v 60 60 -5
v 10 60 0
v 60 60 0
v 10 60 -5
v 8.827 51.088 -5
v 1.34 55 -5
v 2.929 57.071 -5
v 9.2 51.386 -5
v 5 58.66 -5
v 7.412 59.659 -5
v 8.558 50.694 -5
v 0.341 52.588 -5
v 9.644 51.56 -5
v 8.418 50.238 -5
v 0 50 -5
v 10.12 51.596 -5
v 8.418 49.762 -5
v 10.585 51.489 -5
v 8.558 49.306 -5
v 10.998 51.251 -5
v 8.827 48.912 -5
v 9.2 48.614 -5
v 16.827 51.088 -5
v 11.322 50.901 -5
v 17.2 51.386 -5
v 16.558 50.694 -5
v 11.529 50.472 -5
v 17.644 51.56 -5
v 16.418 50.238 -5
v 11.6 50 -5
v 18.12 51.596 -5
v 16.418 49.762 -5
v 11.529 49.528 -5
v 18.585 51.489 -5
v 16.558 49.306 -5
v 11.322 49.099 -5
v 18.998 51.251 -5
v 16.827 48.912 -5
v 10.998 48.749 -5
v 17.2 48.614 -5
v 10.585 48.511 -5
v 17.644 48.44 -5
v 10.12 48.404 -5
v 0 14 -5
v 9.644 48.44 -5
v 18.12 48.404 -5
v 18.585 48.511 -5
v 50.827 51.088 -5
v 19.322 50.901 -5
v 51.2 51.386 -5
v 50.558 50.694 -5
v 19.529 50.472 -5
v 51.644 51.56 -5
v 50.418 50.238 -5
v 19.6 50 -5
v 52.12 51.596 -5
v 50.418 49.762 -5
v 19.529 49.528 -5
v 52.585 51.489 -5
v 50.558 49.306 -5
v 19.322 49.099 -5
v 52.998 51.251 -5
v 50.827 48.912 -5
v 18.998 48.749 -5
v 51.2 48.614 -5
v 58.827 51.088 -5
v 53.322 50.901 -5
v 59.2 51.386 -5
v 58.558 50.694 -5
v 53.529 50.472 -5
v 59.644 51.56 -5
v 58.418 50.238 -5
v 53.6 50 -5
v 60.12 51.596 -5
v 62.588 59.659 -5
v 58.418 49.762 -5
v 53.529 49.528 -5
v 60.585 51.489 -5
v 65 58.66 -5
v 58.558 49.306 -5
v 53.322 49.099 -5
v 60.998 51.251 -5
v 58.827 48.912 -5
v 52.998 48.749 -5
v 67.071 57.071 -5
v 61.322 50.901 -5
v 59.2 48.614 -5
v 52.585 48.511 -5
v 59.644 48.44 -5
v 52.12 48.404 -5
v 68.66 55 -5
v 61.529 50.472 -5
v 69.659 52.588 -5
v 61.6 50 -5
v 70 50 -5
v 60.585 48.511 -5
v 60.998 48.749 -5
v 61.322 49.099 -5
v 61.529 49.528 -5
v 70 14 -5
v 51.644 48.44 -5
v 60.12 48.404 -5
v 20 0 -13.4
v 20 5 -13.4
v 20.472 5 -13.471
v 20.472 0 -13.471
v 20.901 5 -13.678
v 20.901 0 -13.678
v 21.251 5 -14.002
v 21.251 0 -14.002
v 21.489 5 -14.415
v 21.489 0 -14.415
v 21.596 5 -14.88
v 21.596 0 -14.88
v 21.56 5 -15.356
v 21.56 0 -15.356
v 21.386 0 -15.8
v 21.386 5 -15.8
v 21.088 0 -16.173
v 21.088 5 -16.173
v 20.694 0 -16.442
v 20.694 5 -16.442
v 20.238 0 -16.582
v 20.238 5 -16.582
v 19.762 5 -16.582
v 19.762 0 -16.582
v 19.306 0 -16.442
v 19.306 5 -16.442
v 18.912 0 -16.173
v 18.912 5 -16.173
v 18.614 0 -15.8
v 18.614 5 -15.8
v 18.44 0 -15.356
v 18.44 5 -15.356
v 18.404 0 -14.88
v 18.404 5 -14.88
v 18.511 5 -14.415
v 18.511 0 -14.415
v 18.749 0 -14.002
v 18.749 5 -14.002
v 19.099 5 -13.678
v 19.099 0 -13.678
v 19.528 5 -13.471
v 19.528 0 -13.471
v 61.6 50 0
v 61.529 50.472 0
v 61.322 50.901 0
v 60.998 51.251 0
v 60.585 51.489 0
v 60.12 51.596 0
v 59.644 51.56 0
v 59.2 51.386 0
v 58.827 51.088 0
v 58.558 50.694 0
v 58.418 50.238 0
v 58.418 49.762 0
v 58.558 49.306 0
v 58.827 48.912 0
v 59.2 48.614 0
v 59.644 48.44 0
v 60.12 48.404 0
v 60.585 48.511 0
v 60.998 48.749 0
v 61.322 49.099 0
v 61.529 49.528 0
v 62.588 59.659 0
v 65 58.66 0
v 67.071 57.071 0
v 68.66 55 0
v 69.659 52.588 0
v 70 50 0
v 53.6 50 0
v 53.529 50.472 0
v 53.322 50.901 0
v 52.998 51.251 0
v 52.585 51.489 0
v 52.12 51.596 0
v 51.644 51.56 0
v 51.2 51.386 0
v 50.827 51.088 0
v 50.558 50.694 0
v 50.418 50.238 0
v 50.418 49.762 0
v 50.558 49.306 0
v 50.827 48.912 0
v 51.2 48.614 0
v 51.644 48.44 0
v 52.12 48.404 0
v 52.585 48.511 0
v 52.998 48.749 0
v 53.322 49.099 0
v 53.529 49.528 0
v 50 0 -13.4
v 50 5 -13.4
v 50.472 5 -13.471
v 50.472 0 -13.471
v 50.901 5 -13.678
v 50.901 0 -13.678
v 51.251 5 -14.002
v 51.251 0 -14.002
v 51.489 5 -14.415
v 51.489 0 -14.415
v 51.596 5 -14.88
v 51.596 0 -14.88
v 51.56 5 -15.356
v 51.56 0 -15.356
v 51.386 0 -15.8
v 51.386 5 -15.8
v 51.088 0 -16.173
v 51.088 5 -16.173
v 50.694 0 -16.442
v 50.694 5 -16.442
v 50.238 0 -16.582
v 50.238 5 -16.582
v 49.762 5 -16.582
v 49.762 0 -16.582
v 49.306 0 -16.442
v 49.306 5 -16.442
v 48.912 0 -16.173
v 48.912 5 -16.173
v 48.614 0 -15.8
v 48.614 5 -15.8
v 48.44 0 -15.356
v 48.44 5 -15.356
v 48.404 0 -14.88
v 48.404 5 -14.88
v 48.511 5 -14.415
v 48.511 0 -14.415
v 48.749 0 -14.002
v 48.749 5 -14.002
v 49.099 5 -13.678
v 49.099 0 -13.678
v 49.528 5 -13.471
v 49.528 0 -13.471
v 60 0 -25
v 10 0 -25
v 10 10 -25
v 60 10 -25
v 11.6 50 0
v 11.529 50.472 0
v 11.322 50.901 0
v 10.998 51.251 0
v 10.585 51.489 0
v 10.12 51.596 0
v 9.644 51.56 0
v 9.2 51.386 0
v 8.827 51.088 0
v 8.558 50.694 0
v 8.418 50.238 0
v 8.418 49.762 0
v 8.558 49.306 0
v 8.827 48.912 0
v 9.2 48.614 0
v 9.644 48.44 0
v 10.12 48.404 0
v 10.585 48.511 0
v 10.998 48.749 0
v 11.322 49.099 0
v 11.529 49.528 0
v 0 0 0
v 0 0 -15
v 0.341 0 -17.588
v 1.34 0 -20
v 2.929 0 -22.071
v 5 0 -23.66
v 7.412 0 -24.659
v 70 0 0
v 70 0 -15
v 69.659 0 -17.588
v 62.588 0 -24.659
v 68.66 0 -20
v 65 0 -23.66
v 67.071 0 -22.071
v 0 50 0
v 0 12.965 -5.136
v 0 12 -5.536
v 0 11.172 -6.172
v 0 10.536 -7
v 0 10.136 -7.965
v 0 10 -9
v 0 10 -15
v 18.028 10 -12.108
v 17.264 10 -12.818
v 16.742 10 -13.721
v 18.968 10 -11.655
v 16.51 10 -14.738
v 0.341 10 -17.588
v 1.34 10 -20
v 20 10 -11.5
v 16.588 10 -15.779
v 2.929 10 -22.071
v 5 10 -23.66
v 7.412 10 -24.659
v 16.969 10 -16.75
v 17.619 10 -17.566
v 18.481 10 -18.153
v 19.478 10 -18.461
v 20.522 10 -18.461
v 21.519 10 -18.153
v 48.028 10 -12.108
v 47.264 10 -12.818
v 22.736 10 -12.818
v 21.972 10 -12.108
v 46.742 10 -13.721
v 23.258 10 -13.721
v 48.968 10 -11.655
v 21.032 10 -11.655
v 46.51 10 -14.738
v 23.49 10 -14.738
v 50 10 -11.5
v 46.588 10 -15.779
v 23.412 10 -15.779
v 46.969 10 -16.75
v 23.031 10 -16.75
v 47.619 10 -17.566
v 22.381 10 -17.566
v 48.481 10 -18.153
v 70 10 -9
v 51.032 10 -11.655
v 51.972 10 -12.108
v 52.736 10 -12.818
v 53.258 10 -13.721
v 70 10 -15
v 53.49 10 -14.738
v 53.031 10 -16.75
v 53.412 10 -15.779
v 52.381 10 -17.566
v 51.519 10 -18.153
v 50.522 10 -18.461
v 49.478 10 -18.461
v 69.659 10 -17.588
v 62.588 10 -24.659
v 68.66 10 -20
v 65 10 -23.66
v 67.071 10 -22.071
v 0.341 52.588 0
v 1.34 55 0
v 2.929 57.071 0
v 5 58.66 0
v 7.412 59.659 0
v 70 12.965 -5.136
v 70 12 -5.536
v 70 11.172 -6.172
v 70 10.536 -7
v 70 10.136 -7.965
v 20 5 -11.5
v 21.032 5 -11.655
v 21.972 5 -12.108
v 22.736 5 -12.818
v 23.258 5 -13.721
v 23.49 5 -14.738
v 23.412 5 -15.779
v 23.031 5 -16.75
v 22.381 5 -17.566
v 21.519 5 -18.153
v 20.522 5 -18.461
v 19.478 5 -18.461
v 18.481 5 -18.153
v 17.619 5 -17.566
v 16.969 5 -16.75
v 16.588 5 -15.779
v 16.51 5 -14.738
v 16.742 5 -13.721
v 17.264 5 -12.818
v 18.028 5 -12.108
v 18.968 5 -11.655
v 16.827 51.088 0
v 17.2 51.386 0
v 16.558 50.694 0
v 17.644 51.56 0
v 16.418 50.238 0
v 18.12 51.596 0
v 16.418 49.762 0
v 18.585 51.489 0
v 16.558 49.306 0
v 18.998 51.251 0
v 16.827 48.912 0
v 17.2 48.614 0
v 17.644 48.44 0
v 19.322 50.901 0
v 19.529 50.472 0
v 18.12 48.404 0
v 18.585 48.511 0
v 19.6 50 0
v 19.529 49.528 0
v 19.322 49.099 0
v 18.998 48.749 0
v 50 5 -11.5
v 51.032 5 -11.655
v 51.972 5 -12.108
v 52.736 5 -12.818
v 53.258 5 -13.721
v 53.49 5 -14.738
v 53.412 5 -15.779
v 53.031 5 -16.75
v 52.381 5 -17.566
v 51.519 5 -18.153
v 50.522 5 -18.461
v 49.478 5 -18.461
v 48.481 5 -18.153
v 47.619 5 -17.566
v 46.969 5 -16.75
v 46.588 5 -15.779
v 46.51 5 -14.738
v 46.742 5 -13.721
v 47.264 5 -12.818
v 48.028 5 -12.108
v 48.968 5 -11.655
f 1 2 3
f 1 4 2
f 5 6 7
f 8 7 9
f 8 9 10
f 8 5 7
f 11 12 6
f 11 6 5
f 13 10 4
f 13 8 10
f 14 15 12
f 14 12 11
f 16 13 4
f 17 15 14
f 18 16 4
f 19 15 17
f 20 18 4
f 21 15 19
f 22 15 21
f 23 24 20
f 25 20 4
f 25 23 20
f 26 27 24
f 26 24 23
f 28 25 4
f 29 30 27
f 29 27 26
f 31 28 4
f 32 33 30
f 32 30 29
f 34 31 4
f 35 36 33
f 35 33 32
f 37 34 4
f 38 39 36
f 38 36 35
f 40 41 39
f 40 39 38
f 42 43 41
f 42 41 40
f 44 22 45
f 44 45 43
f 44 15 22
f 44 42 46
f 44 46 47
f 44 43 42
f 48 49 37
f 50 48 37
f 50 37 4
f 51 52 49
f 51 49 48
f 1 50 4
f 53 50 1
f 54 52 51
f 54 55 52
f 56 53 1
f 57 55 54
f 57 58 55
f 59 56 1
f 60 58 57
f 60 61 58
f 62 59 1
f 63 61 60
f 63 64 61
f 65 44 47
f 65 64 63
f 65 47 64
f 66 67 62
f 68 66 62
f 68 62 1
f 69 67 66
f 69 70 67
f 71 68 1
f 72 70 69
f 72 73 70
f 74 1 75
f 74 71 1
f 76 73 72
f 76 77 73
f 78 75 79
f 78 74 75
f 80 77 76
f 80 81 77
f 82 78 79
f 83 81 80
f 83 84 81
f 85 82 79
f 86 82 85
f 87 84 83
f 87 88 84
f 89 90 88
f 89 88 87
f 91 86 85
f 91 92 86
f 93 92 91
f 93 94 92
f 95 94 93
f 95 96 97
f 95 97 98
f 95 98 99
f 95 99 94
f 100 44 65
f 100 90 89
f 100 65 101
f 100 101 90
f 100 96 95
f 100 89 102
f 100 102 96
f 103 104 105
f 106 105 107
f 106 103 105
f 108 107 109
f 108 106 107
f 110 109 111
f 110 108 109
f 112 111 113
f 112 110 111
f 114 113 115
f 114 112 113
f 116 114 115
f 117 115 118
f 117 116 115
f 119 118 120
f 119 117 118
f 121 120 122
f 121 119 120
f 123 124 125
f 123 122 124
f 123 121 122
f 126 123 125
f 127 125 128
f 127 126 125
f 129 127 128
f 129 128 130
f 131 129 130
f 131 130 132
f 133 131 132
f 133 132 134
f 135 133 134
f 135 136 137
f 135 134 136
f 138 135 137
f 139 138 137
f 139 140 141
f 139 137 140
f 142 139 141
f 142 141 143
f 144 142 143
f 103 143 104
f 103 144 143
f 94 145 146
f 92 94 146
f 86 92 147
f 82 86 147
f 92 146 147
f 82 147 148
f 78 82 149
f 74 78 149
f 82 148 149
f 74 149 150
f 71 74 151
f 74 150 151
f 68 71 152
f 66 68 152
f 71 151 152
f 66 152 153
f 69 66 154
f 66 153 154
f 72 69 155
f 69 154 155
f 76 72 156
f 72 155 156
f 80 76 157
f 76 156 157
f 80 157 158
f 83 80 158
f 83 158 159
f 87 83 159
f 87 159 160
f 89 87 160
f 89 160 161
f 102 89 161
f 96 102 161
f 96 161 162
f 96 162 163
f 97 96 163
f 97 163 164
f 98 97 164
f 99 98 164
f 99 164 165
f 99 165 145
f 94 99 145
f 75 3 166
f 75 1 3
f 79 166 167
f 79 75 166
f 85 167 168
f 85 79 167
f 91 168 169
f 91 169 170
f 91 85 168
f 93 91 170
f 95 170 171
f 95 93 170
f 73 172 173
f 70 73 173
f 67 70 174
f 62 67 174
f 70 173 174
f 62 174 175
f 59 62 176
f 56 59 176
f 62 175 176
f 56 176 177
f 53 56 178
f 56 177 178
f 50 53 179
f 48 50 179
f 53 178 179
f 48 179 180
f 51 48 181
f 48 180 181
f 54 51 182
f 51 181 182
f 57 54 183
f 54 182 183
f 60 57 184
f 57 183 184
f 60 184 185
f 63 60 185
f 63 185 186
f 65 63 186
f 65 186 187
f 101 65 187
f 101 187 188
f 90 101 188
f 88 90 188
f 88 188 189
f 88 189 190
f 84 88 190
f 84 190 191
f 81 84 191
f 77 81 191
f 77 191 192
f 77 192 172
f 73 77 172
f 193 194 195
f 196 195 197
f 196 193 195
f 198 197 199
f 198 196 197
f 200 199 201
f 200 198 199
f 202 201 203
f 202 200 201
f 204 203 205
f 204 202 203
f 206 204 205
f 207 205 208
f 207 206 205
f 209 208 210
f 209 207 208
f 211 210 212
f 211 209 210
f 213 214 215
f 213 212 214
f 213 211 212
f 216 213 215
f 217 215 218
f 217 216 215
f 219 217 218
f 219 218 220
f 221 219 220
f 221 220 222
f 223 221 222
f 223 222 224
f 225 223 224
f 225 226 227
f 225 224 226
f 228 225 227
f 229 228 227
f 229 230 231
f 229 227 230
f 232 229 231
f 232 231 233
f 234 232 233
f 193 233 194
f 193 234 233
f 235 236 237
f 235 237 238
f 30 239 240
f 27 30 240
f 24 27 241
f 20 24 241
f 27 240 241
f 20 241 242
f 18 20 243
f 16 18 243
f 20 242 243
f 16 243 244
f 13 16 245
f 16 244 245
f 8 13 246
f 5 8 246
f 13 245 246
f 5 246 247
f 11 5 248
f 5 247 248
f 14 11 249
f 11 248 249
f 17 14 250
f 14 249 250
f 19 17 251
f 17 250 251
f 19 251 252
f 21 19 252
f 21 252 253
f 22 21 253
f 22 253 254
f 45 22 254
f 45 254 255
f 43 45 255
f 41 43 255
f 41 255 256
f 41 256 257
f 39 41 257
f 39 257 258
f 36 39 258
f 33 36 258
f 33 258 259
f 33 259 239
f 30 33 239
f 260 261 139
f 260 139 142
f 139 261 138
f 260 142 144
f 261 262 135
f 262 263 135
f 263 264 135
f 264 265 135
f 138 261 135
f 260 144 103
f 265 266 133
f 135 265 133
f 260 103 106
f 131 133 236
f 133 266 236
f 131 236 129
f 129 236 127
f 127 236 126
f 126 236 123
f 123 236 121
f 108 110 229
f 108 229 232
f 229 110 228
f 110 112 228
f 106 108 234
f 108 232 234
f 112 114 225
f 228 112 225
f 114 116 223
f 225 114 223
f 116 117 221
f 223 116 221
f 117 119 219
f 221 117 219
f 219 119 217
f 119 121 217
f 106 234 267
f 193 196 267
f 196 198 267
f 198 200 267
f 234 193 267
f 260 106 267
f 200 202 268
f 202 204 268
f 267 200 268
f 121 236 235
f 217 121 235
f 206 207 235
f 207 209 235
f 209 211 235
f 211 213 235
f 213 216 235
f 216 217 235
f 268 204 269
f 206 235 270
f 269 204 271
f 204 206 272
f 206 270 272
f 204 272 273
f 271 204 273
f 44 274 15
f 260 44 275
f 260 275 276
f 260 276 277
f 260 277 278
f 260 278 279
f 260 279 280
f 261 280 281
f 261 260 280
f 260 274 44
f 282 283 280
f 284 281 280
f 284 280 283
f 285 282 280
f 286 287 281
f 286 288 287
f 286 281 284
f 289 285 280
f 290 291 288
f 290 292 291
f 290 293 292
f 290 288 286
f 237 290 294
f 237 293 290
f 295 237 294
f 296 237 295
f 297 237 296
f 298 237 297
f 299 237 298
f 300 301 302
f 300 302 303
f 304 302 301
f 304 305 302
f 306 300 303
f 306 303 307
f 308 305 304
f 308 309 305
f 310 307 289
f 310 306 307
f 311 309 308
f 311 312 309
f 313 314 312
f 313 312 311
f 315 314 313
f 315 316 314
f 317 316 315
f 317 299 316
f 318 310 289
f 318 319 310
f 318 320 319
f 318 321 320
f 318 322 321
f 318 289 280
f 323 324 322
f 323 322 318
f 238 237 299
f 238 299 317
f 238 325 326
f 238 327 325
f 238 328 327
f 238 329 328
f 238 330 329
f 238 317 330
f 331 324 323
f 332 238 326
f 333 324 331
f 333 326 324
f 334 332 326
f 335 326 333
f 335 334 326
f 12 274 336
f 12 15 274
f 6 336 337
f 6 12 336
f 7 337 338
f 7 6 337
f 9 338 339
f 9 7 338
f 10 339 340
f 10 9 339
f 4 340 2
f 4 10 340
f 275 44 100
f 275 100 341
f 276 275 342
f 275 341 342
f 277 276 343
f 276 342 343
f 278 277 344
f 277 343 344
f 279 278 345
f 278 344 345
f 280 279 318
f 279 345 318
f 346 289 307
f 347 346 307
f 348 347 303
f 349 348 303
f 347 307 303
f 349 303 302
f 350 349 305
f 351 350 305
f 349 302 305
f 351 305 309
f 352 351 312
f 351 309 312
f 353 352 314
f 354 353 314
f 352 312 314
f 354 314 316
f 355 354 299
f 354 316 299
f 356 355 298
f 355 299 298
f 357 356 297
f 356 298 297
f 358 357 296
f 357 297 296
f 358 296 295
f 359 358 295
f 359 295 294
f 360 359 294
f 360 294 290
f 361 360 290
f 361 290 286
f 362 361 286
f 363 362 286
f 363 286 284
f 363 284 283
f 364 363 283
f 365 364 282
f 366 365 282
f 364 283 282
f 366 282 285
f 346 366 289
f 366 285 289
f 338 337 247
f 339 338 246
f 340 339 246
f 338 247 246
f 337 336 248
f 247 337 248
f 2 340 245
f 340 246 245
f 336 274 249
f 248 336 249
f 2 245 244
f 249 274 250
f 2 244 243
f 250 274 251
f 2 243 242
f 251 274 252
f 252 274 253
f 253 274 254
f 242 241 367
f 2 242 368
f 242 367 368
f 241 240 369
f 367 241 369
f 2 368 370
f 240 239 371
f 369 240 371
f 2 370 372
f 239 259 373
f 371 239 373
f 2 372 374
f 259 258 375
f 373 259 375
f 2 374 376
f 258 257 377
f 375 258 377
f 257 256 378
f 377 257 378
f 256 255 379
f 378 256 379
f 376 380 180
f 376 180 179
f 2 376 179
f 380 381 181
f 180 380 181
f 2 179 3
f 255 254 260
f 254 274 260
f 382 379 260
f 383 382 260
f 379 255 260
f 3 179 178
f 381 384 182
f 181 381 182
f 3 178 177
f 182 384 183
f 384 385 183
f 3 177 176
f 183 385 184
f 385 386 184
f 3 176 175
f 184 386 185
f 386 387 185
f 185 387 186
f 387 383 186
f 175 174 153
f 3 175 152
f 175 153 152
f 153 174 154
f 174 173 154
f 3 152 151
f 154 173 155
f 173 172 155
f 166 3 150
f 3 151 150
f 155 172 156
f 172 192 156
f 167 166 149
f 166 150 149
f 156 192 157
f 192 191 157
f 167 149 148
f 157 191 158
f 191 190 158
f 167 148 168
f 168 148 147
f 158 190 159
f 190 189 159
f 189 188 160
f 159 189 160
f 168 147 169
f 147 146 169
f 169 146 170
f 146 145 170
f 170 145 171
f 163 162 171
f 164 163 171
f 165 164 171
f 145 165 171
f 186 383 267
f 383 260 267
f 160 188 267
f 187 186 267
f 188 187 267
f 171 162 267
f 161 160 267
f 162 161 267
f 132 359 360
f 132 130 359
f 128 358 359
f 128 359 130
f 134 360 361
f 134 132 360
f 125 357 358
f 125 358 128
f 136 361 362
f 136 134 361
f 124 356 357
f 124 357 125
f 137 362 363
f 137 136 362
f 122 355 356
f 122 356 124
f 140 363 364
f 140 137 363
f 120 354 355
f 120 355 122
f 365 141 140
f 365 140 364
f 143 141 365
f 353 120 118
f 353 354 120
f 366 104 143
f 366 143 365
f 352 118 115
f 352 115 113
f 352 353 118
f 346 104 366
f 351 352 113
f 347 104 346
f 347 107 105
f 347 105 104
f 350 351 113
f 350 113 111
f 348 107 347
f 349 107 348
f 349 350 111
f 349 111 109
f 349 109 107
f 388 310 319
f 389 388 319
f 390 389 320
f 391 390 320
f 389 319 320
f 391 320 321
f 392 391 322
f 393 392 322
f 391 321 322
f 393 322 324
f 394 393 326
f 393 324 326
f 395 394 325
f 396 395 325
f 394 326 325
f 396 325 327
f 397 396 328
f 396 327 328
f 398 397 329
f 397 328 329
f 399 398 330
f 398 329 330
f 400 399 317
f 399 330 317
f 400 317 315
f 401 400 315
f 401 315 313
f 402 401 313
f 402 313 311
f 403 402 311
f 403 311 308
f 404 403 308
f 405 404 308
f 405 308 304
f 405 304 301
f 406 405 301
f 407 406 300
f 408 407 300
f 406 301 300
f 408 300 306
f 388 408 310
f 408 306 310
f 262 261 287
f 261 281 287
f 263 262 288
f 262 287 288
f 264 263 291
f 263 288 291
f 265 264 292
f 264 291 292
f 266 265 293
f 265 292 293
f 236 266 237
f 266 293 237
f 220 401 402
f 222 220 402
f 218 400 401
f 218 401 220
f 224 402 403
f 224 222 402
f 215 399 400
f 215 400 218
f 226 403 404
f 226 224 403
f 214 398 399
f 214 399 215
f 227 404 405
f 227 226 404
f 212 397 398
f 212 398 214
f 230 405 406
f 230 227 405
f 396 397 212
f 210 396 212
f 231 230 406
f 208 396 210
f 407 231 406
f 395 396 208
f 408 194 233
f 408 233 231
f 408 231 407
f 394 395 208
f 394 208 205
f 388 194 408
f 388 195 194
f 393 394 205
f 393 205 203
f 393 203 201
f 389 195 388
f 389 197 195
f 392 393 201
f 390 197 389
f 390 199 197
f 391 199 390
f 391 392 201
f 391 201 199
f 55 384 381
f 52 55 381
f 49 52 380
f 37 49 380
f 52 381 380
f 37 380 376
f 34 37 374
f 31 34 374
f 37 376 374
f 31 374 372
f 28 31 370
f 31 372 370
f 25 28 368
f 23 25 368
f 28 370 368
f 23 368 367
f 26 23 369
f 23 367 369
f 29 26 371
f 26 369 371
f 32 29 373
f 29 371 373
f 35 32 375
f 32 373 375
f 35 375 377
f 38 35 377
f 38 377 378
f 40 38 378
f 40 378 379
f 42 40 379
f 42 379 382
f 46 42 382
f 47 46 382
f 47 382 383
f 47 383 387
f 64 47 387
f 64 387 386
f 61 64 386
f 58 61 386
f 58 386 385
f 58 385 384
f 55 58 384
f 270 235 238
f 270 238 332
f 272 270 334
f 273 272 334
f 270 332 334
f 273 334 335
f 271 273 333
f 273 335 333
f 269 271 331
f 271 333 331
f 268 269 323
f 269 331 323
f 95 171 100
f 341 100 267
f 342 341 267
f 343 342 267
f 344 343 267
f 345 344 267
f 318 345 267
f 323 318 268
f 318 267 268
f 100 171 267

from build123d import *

# Parameters (mm, degrees)
SKETCH1_W           = 70
SKETCH1_H           = 25
SKETCH1_R           = 1.6
BOSS_EXTRUDE2_DEPTH = 10
SKETCH2_W           = 70
SKETCH2_H           = 5
BOSS_EXTRUDE3_DEPTH = 50
SKETCH3_R           = 3.5
CUT_EXTRUDE1_DEPTH  = 5
FILLET1_R           = 4
FILLET2_R           = 10
SKETCH4_R           = 1.6
CUT_EXTRUDE2_DEPTH  = 96.524865873


with BuildPart() as part:
    # Sketch1 → Boss-Extrude2 (new body)
    with BuildSketch(Plane(origin=(0, 0, 0), x_dir=(1, 0, 0), z_dir=(0, 1, 0))):
        with Locations((35, 12.5)):
            Rectangle(SKETCH1_W, SKETCH1_H)
        with Locations(Location((20, 15, 0), (0, 0, 270))):
            Circle(SKETCH1_R, mode=Mode.SUBTRACT)
        with Locations(Location((50, 15, 0), (0, 0, 270))):
            Circle(SKETCH1_R, mode=Mode.SUBTRACT)
    extrude(amount=BOSS_EXTRUDE2_DEPTH)

    # Sketch2 → Boss-Extrude3 (add)
    with BuildSketch(Plane(origin=(0, 10, 0), x_dir=(1, 0, 0), z_dir=(0, 1, 0))):
        with Locations((35, 2.5)):
            Rectangle(SKETCH2_W, SKETCH2_H)
    extrude(amount=BOSS_EXTRUDE3_DEPTH)

    # Sketch3 → Cut-Extrude1 (cut)
    with BuildSketch(Plane(origin=(0, 10, 0), x_dir=(1, 0, 0), z_dir=(0, 1, 0))):
        with Locations(Location((20, 15, 0), (0, 0, 270))):
            Circle(SKETCH3_R)
        with Locations(Location((50, 15, 0), (0, 0, 270))):
            Circle(SKETCH3_R)
    extrude(amount=-CUT_EXTRUDE1_DEPTH, mode=Mode.SUBTRACT)

    # Fillet1
    fillet1_edges = [part.edges().sort_by_distance(p)[0] for p in [
        (35, 10, -5),
    ]]
    fillet(fillet1_edges, radius=FILLET1_R)

    # Fillet2
    fillet2_edges = [part.edges().sort_by_distance(p)[0] for p in [
        (0, 60, -2.5),
        (70, 60, -2.5),
        (0, 5, -25),
        (70, 5, -25),
    ]]
    fillet(fillet2_edges, radius=FILLET2_R)

    # Sketch4 → Cut-Extrude2 (cut, through all)
    with BuildSketch(Plane.XY):
        with Locations((10, 50)):
            Circle(SKETCH4_R)
        with Locations((18, 50)):
            Circle(SKETCH4_R)
        with Locations((52, 50)):
            Circle(SKETCH4_R)
        with Locations((60, 50)):
            Circle(SKETCH4_R)
    extrude(amount=-CUT_EXTRUDE2_DEPTH, mode=Mode.SUBTRACT)


solid = part.part
